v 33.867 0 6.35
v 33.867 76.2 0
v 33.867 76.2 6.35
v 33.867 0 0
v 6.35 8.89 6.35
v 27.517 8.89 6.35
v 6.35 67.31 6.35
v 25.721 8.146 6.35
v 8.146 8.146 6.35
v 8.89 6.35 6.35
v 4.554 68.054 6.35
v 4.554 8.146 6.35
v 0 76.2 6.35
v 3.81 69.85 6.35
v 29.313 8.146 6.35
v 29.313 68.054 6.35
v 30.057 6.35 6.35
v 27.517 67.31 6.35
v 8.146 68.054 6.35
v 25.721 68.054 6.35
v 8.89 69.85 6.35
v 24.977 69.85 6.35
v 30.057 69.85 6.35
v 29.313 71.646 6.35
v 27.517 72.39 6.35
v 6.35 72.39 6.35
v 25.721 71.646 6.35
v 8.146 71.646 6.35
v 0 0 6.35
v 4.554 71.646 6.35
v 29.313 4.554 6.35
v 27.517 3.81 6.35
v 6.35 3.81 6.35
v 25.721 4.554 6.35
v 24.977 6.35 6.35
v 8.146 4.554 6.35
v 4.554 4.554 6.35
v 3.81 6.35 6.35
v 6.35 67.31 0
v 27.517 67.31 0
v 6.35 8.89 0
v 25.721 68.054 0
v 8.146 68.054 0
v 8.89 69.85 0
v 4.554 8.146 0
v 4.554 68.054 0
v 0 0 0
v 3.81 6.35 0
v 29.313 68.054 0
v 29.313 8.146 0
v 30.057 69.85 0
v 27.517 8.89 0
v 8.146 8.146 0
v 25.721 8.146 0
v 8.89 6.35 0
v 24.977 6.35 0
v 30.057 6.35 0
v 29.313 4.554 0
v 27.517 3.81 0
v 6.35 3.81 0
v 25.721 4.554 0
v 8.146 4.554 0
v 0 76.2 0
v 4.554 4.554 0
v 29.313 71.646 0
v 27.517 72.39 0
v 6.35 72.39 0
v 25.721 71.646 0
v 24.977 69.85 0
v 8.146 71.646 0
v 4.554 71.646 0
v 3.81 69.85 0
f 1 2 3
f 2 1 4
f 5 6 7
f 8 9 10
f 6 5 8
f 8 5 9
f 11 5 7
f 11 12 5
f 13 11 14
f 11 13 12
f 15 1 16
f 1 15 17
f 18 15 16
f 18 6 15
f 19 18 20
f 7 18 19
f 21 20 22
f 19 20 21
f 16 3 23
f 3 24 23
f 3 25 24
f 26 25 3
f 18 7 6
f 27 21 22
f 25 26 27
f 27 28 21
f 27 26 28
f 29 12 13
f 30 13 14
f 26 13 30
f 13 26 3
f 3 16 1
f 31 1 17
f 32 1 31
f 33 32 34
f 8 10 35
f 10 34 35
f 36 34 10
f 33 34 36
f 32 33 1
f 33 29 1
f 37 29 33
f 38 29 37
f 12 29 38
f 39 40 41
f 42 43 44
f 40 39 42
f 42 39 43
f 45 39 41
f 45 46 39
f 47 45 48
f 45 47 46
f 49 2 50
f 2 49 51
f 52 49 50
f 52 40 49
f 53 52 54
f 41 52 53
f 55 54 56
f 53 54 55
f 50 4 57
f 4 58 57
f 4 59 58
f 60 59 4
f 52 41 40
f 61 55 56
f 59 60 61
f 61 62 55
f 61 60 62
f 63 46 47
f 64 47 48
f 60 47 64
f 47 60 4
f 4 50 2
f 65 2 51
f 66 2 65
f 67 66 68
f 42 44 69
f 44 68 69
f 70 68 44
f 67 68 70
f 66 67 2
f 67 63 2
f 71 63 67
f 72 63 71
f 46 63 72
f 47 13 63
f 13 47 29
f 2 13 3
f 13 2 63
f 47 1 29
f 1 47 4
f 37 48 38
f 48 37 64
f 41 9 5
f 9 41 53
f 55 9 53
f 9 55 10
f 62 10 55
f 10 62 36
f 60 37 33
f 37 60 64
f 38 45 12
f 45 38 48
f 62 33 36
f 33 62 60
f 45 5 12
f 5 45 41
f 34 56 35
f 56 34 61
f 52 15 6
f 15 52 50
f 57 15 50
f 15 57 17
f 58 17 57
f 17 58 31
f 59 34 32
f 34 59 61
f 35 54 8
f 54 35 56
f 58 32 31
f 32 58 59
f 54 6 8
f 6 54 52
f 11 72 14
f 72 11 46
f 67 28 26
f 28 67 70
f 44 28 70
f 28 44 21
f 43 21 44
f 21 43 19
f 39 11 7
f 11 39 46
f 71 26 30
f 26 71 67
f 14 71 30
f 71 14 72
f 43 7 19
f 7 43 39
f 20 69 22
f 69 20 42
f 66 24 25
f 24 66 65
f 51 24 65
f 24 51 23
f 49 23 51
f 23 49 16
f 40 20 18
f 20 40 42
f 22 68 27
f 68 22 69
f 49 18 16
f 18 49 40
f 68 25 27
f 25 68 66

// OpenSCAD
function mm(i) = i*25.4; 
    thickness = mm(.25); 
    radius = mm(4); 
	 screwWidth = mm(.2);
	 plateWidth = mm(3);
    
    
module plate(thickness=mm(.25), radius=mm(4), screwWidth=mm(.2), plateWidth=mm(3)) 
 { 
     difference()
		{
			cube([radius-2*radius/3, plateWidth, thickness]);
			translate([mm(.25),mm(.25),-1])
				{
				cylinder(thickness+2, screwWidth/2, screwWidth/2,0);
				}
			translate([radius-2*radius/3-mm(.25),mm(.25),-1])
				{
				cylinder(thickness+2, screwWidth/2, screwWidth/2,0);
				}
			translate([mm(.25),plateWidth-mm(.25),-1])
				{
				cylinder(thickness+2, screwWidth/2, screwWidth/2,0);
				}
			translate([radius-2*radius/3-mm(.25),plateWidth-mm(.25),-1])
				{
				cylinder(thickness+2, screwWidth/2, screwWidth/2,0);
				}
 }
}   
    

plate();
